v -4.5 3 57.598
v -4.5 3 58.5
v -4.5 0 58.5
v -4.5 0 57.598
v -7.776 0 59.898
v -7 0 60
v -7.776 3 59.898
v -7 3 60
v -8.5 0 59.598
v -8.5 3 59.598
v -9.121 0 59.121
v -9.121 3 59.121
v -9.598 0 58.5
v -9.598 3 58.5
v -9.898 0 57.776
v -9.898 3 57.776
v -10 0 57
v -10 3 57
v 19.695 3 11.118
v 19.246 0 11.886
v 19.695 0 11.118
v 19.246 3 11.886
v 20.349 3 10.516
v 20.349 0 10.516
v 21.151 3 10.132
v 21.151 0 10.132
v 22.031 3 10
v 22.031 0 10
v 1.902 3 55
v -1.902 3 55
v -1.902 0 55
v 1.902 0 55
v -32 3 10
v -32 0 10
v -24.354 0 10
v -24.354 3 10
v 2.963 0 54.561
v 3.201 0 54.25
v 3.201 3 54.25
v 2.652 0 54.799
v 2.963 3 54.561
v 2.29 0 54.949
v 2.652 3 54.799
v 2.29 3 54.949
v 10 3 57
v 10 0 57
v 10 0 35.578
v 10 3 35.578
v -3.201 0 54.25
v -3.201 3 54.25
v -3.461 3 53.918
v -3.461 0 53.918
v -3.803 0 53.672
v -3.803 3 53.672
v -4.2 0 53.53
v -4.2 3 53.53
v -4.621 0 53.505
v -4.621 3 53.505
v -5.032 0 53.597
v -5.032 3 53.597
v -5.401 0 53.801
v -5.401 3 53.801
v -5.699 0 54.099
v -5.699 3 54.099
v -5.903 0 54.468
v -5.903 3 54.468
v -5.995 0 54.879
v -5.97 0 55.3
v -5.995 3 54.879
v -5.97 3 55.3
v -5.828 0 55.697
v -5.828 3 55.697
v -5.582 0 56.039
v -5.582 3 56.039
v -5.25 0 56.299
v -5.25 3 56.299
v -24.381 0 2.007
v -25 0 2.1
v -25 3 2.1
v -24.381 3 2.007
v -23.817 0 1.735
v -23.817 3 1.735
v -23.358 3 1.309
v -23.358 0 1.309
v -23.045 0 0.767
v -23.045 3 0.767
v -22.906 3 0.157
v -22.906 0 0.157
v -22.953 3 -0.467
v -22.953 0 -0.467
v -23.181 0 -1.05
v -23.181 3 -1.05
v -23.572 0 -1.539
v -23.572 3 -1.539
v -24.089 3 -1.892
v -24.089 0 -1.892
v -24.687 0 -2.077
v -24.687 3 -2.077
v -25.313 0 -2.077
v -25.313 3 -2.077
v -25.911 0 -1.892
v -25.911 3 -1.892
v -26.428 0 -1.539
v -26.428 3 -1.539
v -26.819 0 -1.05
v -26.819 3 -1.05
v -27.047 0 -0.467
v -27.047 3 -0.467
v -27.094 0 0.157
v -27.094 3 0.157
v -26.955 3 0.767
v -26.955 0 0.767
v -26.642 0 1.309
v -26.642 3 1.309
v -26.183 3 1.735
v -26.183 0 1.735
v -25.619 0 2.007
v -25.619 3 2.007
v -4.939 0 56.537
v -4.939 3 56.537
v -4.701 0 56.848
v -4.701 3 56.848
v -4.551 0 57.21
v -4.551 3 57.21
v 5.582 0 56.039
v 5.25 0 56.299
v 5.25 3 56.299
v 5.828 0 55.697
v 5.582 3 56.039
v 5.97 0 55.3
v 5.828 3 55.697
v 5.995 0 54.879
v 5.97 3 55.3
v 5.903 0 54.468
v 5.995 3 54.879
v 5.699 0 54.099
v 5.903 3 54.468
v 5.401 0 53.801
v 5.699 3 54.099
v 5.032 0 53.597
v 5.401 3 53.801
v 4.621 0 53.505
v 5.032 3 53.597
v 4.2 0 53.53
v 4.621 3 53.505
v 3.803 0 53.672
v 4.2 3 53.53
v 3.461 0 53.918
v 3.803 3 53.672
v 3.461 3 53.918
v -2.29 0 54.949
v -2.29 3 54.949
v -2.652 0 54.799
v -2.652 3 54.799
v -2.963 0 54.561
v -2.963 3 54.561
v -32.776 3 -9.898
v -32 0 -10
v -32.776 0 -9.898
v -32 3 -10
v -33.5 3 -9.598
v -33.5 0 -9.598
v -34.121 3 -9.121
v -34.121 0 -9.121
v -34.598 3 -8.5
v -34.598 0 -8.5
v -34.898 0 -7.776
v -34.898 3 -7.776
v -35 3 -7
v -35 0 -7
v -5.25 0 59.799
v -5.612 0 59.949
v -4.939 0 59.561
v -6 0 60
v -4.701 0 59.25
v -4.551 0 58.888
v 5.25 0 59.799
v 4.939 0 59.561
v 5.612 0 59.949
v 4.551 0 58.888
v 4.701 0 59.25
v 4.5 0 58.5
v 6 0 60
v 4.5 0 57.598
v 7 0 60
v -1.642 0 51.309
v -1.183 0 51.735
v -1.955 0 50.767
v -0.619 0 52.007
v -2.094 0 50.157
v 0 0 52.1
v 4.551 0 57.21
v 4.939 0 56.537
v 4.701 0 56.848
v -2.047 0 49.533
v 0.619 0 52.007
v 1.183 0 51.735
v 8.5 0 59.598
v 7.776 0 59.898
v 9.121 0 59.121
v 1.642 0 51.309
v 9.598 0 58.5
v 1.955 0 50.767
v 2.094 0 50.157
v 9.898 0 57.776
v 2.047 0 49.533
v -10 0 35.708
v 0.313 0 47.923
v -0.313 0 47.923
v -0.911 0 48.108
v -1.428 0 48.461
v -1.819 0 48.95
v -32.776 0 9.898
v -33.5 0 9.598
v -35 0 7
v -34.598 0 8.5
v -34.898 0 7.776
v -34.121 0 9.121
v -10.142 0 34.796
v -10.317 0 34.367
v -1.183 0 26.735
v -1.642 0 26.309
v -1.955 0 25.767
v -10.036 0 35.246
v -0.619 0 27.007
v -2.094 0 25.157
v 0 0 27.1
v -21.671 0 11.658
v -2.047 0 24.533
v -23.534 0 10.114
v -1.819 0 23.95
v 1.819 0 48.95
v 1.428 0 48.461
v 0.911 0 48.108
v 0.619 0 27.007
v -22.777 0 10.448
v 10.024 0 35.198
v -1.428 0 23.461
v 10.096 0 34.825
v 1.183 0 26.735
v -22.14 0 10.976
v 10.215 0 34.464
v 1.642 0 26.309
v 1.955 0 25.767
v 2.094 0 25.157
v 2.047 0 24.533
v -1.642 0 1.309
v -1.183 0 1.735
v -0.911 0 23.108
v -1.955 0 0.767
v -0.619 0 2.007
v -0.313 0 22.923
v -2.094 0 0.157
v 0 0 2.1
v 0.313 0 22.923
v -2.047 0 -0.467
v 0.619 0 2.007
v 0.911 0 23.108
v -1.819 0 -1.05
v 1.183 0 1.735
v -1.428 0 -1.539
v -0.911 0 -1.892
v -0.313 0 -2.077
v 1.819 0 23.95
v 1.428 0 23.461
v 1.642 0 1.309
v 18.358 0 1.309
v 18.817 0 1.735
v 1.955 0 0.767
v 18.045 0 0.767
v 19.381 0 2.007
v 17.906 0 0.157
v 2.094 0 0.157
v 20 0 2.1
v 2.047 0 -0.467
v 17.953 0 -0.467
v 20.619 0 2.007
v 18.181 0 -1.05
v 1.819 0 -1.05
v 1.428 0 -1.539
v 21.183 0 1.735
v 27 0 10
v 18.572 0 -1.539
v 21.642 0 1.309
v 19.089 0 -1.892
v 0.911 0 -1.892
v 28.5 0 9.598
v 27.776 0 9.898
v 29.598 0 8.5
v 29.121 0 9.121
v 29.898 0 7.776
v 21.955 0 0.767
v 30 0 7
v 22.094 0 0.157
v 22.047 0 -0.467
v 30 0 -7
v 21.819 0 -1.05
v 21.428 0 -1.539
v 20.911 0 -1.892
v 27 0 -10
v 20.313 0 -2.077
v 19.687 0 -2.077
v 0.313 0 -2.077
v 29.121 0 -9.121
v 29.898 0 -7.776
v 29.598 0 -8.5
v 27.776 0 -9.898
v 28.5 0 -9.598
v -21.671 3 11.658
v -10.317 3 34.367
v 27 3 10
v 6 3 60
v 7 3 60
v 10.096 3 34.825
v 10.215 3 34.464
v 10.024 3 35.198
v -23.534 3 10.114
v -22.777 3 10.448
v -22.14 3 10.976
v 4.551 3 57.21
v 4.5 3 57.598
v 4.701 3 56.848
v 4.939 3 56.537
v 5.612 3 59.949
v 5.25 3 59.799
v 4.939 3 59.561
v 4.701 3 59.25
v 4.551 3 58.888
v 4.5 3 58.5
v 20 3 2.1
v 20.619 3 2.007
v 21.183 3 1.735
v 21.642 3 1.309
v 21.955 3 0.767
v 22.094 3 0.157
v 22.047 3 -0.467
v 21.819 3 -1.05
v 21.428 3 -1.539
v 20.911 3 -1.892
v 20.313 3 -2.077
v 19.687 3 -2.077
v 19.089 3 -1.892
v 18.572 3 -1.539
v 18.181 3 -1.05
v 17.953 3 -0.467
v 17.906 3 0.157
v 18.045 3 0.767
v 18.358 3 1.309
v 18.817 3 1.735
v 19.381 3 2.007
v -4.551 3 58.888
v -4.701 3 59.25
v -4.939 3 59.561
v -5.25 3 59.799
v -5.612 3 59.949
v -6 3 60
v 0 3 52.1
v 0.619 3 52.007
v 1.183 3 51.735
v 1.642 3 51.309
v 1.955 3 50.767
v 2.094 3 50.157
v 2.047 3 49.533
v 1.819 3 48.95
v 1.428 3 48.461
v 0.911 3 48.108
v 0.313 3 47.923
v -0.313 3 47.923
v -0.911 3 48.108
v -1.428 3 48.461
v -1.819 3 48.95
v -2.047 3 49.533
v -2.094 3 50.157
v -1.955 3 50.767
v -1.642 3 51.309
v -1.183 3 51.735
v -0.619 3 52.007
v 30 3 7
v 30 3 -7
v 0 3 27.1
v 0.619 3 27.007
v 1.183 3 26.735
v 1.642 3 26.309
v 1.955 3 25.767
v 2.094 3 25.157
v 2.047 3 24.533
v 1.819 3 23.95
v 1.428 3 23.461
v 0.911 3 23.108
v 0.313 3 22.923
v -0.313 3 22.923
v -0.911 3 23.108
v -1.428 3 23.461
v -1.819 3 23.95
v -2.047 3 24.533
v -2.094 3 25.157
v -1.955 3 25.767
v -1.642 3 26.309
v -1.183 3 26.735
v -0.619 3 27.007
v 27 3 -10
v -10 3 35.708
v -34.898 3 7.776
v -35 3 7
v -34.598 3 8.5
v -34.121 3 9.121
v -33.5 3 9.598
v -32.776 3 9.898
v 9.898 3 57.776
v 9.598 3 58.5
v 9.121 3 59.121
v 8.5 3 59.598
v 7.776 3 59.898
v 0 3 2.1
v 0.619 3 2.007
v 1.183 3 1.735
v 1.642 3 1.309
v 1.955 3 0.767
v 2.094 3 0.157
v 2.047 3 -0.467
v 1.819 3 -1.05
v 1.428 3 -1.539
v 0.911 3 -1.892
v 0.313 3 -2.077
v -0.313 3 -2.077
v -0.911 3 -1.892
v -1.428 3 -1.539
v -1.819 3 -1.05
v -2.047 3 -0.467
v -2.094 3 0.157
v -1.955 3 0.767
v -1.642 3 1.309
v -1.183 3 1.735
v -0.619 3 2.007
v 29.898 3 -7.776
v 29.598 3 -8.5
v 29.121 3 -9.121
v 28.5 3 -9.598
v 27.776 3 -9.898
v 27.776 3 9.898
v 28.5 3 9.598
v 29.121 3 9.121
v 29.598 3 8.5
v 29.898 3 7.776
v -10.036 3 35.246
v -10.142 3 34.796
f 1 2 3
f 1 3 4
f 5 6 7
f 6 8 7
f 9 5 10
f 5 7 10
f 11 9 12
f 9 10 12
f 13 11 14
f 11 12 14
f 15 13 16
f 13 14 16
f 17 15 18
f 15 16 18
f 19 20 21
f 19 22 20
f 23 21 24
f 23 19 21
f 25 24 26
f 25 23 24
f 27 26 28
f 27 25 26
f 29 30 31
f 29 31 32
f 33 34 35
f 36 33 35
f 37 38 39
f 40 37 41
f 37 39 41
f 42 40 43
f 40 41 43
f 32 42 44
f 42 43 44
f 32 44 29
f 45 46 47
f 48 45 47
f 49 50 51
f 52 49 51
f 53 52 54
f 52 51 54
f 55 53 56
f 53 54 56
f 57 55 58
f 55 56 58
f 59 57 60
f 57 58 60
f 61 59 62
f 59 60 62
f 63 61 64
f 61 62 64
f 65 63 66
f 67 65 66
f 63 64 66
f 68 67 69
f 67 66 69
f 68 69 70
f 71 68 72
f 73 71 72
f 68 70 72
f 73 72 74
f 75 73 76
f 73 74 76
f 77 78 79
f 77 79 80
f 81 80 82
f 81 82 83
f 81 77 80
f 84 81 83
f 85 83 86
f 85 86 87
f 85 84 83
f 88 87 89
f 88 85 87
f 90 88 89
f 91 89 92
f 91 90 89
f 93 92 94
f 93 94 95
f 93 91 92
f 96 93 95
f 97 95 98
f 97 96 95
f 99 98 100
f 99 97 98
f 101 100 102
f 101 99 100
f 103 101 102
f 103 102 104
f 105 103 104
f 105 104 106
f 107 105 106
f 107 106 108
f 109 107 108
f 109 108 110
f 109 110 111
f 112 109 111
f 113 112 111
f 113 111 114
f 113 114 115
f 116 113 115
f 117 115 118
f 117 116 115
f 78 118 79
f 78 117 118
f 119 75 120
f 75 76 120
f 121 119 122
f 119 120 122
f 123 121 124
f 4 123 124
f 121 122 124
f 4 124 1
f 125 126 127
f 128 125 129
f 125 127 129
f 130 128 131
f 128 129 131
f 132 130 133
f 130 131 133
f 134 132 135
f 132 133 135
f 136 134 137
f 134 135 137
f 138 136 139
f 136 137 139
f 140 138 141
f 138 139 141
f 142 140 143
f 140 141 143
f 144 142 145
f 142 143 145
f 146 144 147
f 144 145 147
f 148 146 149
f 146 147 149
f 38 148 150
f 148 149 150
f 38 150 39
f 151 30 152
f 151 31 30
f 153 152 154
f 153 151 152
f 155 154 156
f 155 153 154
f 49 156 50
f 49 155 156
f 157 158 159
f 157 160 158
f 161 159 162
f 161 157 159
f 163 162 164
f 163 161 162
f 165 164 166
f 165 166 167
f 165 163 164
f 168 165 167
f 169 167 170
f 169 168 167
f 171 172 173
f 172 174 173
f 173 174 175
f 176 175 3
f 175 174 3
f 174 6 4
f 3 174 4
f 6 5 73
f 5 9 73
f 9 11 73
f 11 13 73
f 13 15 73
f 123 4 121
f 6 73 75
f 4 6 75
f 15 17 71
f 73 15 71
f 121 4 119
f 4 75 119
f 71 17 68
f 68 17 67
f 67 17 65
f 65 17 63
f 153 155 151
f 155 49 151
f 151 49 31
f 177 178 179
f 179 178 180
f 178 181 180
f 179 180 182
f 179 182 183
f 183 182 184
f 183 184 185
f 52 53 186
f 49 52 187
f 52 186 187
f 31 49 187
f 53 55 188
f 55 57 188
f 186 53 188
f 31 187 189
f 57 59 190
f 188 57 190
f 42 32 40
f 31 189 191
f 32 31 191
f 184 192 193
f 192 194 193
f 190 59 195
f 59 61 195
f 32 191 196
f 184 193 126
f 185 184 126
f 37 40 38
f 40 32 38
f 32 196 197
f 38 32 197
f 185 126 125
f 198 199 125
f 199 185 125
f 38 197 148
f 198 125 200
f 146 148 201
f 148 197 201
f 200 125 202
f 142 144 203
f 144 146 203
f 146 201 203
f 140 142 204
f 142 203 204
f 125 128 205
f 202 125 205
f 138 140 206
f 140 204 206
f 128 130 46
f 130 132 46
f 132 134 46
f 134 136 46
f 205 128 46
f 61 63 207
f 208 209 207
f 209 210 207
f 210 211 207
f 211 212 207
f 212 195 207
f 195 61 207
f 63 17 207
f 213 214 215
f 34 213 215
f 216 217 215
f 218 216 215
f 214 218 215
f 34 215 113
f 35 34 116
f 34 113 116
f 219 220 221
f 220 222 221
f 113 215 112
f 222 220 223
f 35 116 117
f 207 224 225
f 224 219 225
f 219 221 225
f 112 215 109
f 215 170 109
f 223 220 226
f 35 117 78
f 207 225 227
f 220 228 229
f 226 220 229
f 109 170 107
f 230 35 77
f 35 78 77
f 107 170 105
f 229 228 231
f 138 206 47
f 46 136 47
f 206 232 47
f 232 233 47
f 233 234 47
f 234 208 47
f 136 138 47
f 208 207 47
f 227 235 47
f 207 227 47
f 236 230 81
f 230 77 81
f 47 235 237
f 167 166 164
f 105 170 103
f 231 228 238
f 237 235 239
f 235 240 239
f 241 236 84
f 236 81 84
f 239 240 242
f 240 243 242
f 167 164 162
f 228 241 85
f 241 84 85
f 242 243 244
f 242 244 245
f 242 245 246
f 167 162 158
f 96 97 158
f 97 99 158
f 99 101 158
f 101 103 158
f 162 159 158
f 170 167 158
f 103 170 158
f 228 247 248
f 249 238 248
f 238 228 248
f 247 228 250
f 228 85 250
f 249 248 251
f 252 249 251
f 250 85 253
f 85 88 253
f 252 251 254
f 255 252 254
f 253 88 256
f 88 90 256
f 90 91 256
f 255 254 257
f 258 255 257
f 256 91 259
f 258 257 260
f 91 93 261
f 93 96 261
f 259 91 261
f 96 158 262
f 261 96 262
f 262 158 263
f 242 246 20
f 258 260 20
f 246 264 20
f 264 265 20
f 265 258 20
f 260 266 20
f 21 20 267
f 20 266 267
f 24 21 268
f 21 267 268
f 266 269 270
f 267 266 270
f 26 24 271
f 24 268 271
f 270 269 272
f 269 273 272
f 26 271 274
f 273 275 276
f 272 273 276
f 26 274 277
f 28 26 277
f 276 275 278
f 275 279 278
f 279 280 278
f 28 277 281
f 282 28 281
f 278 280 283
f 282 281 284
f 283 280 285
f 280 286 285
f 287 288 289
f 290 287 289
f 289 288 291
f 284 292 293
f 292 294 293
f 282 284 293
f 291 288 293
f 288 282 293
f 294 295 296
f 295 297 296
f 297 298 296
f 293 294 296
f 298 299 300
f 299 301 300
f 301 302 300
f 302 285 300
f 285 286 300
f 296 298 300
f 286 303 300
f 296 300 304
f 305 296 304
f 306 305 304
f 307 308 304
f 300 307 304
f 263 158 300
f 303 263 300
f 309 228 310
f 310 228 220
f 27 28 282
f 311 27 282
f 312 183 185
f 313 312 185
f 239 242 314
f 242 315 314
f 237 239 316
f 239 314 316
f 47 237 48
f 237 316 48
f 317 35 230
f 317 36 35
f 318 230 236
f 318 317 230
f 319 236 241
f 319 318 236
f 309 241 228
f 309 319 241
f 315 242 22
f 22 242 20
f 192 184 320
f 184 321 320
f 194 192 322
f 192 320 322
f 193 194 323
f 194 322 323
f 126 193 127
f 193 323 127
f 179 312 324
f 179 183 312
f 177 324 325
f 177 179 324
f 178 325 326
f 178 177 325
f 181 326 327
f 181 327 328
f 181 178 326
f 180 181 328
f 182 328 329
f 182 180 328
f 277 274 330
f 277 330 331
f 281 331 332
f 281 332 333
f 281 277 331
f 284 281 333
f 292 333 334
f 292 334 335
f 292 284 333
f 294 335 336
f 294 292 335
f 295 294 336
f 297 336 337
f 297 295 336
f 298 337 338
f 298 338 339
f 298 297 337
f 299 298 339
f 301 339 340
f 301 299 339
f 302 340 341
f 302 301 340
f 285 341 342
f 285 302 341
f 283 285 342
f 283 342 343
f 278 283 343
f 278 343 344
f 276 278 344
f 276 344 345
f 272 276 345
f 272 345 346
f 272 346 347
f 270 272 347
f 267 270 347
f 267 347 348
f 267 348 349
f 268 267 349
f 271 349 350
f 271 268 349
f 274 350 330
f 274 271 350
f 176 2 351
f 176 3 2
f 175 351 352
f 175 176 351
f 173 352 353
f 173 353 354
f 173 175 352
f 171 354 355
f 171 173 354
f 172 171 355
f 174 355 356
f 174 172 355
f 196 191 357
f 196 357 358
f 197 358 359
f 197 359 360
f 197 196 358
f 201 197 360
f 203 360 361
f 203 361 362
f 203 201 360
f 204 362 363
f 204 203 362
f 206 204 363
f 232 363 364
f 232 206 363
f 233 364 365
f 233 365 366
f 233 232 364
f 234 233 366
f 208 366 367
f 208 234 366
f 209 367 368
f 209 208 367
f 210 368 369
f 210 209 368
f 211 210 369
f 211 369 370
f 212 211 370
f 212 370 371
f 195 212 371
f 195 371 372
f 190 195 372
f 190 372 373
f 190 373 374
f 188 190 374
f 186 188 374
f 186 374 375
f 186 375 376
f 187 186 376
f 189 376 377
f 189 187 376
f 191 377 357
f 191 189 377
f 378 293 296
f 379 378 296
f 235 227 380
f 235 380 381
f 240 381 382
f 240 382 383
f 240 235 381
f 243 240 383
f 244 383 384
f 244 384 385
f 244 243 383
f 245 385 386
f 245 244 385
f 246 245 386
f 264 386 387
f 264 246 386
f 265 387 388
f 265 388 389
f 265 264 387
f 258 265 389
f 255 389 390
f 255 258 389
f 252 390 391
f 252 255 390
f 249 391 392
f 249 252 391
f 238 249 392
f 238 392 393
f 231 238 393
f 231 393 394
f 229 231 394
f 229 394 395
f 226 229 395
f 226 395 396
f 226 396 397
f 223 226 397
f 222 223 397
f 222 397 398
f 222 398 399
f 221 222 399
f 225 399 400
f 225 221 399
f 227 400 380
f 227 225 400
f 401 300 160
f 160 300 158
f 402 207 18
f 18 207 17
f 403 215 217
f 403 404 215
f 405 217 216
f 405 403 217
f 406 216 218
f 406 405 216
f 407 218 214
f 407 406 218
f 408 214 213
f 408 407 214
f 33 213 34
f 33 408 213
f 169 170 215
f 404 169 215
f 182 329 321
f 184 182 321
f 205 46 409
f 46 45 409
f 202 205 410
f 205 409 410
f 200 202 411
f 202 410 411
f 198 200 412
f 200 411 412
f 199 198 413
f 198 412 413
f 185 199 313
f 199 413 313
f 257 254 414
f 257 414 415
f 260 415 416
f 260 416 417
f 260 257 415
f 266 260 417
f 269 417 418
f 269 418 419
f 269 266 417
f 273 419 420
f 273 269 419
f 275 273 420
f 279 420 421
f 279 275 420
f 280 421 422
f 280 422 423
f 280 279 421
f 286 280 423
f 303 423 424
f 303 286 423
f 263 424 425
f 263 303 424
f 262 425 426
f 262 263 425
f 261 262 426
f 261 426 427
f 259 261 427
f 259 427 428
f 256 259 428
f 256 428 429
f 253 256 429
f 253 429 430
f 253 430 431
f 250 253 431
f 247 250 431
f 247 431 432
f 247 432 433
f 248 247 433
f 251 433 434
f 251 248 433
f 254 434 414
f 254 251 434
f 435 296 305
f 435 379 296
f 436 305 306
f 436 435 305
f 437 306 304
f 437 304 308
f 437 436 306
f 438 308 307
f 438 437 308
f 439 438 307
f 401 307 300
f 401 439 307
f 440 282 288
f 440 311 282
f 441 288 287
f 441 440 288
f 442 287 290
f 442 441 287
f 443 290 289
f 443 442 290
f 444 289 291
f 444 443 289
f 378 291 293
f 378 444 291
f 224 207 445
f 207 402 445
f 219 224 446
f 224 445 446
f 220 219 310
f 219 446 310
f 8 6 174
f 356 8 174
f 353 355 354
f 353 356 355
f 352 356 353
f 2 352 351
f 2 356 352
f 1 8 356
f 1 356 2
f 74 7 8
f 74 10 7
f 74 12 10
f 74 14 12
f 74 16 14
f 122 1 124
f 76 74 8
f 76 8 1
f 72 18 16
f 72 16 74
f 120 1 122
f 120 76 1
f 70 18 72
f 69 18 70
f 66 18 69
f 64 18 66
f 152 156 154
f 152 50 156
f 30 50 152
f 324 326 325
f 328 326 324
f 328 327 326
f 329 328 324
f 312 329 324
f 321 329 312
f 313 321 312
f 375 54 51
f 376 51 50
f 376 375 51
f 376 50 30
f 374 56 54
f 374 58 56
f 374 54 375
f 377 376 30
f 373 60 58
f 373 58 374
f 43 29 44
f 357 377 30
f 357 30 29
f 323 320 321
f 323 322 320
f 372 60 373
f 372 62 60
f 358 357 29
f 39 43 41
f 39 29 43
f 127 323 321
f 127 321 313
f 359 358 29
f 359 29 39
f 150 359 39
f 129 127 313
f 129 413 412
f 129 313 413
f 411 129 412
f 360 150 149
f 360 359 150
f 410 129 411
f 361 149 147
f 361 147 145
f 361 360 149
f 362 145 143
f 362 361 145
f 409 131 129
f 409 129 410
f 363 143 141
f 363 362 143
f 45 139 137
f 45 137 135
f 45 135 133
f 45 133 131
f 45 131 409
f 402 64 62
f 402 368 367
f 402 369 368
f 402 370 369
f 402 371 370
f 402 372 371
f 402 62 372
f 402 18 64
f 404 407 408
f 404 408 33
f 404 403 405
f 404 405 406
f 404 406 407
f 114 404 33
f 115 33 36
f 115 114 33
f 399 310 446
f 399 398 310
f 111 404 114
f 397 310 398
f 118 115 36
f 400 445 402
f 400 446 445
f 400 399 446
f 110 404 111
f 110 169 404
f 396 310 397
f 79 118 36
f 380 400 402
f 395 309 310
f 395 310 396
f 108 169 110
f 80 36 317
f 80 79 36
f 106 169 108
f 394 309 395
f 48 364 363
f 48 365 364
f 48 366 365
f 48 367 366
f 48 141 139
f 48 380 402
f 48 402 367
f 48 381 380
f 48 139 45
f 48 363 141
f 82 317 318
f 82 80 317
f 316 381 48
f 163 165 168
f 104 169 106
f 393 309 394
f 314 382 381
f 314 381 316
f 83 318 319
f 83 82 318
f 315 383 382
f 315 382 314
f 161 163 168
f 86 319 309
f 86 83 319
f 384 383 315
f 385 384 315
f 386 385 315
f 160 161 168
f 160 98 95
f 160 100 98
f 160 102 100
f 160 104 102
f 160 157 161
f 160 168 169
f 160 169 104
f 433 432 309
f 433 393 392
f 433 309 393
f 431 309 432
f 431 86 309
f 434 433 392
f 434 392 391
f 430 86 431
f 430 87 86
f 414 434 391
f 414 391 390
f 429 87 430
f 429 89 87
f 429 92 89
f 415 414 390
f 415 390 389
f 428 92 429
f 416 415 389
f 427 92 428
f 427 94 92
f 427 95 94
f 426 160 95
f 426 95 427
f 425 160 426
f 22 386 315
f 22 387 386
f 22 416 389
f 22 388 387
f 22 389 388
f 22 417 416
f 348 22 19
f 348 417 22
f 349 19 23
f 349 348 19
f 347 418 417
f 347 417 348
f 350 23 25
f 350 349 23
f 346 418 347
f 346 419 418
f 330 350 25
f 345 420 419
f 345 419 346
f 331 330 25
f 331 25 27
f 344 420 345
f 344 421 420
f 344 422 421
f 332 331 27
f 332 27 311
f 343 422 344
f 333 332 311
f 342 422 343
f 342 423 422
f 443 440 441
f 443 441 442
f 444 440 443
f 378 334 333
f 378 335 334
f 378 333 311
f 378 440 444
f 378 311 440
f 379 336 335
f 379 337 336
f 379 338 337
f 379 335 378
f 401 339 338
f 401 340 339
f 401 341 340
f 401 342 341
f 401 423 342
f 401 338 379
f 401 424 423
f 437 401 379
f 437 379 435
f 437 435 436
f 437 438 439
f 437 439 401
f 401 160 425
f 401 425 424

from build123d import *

# Parameters (mm, degrees)
SKETCH_1_R          = 2.1
EXTRUDE_1_DEPTH     = 3
FILLET_1_R          = 3
SKETCH_2_W          = 9
SKETCH_2_H          = 5
CUT_EXTRUDE_1_DEPTH = 3
SKETCH_3_R          = 1.5
CUT_EXTRUDE_2_DEPTH = 10
FILLET_2_R          = 1.5


with BuildPart() as part:
    # 草图1 → 凸台-拉伸1 (new body)
    # profile 1 of 3: a face of its own
    with BuildSketch(Plane(origin=(0, 0, 0), x_dir=(1, 0, 0), z_dir=(0, 1, 0))):
        Polygon((10, -10), (30, -10), (30, 10), (-35, 10), (-35, -10), (-10, -10), (-10, -60), (10, -60), align=None)
        with Locations(Location((0, -50, 0), (0, 0, 270))):
            Circle(SKETCH_1_R, mode=Mode.SUBTRACT)
        with Locations(Location((0, -25, 0), (0, 0, 270))):
            Circle(SKETCH_1_R, mode=Mode.SUBTRACT)
        with Locations(Location((-25, 0, 0), (0, 0, 270))):
            Circle(SKETCH_1_R, mode=Mode.SUBTRACT)
        with Locations(Location((20, 0, 0), (0, 0, 270))):
            Circle(SKETCH_1_R, mode=Mode.SUBTRACT)
        with Locations(Location((0, 0, 0), (0, 0, 270))):
            Circle(SKETCH_1_R, mode=Mode.SUBTRACT)
    # profile 2 of 3: a face of its own
    with BuildSketch(Plane(origin=(0, 0, 0), x_dir=(1, 0, 0), z_dir=(0, 1, 0))):
        Polygon((-10, -10), (-22.5, -10), (-10, -35), align=None)
    # profile 3 of 3: a face of its own
    with BuildSketch(Plane(origin=(0, 0, 0), x_dir=(1, 0, 0), z_dir=(0, 1, 0))):
        Polygon((10, -35), (20, -10), (10, -10), align=None)
    extrude(amount=EXTRUDE_1_DEPTH)

    # 圆角1
    fillet_1_edges = [part.edges().sort_by_distance(p)[0] for p in [
        (10, 1.5, 35),
        (10, 1.5, 60),
        (-10, 1.5, 60),
        (-10, 1.5, 35),
        (-22.5, 1.5, 10),
        (-35, 1.5, 10),
        (-35, 1.5, -10),
        (30, 1.5, -10),
        (30, 1.5, 10),
        (20, 1.5, 10),
    ]]
    fillet(fillet_1_edges, radius=FILLET_1_R)

    # 草图2 → 切除-拉伸1 (cut)
    with BuildSketch(Plane(origin=(0, 3, 0), x_dir=(1, 0, 0), z_dir=(0, 1, 0))):
        with Locations((0, -57.5)):
            Rectangle(SKETCH_2_W, SKETCH_2_H)
    extrude(amount=-CUT_EXTRUDE_1_DEPTH, mode=Mode.SUBTRACT)

    # 草图3 → 切除-拉伸2 (cut)
    with BuildSketch(Plane(origin=(0, 3, 0), x_dir=(1, 0, 0), z_dir=(0, 1, 0))):
        with Locations((-4.5, -55)):
            Circle(SKETCH_3_R)
        with Locations((4.5, -55)):
            Circle(SKETCH_3_R)
    extrude(amount=-CUT_EXTRUDE_2_DEPTH, mode=Mode.SUBTRACT)

    # 圆角2
    fillet_2_edges = [part.edges().sort_by_distance(p)[0] for p in [
        (-4.5, 1.5, 60),
        (4.5, 1.5, 60),
        (4.5, 1.5, 56.5),
        (-3, 1.5, 55),
        (-4.5, 1.5, 56.5),
        (3, 1.5, 55),
    ]]
    fillet(fillet_2_edges, radius=FILLET_2_R)


solid = part.part
